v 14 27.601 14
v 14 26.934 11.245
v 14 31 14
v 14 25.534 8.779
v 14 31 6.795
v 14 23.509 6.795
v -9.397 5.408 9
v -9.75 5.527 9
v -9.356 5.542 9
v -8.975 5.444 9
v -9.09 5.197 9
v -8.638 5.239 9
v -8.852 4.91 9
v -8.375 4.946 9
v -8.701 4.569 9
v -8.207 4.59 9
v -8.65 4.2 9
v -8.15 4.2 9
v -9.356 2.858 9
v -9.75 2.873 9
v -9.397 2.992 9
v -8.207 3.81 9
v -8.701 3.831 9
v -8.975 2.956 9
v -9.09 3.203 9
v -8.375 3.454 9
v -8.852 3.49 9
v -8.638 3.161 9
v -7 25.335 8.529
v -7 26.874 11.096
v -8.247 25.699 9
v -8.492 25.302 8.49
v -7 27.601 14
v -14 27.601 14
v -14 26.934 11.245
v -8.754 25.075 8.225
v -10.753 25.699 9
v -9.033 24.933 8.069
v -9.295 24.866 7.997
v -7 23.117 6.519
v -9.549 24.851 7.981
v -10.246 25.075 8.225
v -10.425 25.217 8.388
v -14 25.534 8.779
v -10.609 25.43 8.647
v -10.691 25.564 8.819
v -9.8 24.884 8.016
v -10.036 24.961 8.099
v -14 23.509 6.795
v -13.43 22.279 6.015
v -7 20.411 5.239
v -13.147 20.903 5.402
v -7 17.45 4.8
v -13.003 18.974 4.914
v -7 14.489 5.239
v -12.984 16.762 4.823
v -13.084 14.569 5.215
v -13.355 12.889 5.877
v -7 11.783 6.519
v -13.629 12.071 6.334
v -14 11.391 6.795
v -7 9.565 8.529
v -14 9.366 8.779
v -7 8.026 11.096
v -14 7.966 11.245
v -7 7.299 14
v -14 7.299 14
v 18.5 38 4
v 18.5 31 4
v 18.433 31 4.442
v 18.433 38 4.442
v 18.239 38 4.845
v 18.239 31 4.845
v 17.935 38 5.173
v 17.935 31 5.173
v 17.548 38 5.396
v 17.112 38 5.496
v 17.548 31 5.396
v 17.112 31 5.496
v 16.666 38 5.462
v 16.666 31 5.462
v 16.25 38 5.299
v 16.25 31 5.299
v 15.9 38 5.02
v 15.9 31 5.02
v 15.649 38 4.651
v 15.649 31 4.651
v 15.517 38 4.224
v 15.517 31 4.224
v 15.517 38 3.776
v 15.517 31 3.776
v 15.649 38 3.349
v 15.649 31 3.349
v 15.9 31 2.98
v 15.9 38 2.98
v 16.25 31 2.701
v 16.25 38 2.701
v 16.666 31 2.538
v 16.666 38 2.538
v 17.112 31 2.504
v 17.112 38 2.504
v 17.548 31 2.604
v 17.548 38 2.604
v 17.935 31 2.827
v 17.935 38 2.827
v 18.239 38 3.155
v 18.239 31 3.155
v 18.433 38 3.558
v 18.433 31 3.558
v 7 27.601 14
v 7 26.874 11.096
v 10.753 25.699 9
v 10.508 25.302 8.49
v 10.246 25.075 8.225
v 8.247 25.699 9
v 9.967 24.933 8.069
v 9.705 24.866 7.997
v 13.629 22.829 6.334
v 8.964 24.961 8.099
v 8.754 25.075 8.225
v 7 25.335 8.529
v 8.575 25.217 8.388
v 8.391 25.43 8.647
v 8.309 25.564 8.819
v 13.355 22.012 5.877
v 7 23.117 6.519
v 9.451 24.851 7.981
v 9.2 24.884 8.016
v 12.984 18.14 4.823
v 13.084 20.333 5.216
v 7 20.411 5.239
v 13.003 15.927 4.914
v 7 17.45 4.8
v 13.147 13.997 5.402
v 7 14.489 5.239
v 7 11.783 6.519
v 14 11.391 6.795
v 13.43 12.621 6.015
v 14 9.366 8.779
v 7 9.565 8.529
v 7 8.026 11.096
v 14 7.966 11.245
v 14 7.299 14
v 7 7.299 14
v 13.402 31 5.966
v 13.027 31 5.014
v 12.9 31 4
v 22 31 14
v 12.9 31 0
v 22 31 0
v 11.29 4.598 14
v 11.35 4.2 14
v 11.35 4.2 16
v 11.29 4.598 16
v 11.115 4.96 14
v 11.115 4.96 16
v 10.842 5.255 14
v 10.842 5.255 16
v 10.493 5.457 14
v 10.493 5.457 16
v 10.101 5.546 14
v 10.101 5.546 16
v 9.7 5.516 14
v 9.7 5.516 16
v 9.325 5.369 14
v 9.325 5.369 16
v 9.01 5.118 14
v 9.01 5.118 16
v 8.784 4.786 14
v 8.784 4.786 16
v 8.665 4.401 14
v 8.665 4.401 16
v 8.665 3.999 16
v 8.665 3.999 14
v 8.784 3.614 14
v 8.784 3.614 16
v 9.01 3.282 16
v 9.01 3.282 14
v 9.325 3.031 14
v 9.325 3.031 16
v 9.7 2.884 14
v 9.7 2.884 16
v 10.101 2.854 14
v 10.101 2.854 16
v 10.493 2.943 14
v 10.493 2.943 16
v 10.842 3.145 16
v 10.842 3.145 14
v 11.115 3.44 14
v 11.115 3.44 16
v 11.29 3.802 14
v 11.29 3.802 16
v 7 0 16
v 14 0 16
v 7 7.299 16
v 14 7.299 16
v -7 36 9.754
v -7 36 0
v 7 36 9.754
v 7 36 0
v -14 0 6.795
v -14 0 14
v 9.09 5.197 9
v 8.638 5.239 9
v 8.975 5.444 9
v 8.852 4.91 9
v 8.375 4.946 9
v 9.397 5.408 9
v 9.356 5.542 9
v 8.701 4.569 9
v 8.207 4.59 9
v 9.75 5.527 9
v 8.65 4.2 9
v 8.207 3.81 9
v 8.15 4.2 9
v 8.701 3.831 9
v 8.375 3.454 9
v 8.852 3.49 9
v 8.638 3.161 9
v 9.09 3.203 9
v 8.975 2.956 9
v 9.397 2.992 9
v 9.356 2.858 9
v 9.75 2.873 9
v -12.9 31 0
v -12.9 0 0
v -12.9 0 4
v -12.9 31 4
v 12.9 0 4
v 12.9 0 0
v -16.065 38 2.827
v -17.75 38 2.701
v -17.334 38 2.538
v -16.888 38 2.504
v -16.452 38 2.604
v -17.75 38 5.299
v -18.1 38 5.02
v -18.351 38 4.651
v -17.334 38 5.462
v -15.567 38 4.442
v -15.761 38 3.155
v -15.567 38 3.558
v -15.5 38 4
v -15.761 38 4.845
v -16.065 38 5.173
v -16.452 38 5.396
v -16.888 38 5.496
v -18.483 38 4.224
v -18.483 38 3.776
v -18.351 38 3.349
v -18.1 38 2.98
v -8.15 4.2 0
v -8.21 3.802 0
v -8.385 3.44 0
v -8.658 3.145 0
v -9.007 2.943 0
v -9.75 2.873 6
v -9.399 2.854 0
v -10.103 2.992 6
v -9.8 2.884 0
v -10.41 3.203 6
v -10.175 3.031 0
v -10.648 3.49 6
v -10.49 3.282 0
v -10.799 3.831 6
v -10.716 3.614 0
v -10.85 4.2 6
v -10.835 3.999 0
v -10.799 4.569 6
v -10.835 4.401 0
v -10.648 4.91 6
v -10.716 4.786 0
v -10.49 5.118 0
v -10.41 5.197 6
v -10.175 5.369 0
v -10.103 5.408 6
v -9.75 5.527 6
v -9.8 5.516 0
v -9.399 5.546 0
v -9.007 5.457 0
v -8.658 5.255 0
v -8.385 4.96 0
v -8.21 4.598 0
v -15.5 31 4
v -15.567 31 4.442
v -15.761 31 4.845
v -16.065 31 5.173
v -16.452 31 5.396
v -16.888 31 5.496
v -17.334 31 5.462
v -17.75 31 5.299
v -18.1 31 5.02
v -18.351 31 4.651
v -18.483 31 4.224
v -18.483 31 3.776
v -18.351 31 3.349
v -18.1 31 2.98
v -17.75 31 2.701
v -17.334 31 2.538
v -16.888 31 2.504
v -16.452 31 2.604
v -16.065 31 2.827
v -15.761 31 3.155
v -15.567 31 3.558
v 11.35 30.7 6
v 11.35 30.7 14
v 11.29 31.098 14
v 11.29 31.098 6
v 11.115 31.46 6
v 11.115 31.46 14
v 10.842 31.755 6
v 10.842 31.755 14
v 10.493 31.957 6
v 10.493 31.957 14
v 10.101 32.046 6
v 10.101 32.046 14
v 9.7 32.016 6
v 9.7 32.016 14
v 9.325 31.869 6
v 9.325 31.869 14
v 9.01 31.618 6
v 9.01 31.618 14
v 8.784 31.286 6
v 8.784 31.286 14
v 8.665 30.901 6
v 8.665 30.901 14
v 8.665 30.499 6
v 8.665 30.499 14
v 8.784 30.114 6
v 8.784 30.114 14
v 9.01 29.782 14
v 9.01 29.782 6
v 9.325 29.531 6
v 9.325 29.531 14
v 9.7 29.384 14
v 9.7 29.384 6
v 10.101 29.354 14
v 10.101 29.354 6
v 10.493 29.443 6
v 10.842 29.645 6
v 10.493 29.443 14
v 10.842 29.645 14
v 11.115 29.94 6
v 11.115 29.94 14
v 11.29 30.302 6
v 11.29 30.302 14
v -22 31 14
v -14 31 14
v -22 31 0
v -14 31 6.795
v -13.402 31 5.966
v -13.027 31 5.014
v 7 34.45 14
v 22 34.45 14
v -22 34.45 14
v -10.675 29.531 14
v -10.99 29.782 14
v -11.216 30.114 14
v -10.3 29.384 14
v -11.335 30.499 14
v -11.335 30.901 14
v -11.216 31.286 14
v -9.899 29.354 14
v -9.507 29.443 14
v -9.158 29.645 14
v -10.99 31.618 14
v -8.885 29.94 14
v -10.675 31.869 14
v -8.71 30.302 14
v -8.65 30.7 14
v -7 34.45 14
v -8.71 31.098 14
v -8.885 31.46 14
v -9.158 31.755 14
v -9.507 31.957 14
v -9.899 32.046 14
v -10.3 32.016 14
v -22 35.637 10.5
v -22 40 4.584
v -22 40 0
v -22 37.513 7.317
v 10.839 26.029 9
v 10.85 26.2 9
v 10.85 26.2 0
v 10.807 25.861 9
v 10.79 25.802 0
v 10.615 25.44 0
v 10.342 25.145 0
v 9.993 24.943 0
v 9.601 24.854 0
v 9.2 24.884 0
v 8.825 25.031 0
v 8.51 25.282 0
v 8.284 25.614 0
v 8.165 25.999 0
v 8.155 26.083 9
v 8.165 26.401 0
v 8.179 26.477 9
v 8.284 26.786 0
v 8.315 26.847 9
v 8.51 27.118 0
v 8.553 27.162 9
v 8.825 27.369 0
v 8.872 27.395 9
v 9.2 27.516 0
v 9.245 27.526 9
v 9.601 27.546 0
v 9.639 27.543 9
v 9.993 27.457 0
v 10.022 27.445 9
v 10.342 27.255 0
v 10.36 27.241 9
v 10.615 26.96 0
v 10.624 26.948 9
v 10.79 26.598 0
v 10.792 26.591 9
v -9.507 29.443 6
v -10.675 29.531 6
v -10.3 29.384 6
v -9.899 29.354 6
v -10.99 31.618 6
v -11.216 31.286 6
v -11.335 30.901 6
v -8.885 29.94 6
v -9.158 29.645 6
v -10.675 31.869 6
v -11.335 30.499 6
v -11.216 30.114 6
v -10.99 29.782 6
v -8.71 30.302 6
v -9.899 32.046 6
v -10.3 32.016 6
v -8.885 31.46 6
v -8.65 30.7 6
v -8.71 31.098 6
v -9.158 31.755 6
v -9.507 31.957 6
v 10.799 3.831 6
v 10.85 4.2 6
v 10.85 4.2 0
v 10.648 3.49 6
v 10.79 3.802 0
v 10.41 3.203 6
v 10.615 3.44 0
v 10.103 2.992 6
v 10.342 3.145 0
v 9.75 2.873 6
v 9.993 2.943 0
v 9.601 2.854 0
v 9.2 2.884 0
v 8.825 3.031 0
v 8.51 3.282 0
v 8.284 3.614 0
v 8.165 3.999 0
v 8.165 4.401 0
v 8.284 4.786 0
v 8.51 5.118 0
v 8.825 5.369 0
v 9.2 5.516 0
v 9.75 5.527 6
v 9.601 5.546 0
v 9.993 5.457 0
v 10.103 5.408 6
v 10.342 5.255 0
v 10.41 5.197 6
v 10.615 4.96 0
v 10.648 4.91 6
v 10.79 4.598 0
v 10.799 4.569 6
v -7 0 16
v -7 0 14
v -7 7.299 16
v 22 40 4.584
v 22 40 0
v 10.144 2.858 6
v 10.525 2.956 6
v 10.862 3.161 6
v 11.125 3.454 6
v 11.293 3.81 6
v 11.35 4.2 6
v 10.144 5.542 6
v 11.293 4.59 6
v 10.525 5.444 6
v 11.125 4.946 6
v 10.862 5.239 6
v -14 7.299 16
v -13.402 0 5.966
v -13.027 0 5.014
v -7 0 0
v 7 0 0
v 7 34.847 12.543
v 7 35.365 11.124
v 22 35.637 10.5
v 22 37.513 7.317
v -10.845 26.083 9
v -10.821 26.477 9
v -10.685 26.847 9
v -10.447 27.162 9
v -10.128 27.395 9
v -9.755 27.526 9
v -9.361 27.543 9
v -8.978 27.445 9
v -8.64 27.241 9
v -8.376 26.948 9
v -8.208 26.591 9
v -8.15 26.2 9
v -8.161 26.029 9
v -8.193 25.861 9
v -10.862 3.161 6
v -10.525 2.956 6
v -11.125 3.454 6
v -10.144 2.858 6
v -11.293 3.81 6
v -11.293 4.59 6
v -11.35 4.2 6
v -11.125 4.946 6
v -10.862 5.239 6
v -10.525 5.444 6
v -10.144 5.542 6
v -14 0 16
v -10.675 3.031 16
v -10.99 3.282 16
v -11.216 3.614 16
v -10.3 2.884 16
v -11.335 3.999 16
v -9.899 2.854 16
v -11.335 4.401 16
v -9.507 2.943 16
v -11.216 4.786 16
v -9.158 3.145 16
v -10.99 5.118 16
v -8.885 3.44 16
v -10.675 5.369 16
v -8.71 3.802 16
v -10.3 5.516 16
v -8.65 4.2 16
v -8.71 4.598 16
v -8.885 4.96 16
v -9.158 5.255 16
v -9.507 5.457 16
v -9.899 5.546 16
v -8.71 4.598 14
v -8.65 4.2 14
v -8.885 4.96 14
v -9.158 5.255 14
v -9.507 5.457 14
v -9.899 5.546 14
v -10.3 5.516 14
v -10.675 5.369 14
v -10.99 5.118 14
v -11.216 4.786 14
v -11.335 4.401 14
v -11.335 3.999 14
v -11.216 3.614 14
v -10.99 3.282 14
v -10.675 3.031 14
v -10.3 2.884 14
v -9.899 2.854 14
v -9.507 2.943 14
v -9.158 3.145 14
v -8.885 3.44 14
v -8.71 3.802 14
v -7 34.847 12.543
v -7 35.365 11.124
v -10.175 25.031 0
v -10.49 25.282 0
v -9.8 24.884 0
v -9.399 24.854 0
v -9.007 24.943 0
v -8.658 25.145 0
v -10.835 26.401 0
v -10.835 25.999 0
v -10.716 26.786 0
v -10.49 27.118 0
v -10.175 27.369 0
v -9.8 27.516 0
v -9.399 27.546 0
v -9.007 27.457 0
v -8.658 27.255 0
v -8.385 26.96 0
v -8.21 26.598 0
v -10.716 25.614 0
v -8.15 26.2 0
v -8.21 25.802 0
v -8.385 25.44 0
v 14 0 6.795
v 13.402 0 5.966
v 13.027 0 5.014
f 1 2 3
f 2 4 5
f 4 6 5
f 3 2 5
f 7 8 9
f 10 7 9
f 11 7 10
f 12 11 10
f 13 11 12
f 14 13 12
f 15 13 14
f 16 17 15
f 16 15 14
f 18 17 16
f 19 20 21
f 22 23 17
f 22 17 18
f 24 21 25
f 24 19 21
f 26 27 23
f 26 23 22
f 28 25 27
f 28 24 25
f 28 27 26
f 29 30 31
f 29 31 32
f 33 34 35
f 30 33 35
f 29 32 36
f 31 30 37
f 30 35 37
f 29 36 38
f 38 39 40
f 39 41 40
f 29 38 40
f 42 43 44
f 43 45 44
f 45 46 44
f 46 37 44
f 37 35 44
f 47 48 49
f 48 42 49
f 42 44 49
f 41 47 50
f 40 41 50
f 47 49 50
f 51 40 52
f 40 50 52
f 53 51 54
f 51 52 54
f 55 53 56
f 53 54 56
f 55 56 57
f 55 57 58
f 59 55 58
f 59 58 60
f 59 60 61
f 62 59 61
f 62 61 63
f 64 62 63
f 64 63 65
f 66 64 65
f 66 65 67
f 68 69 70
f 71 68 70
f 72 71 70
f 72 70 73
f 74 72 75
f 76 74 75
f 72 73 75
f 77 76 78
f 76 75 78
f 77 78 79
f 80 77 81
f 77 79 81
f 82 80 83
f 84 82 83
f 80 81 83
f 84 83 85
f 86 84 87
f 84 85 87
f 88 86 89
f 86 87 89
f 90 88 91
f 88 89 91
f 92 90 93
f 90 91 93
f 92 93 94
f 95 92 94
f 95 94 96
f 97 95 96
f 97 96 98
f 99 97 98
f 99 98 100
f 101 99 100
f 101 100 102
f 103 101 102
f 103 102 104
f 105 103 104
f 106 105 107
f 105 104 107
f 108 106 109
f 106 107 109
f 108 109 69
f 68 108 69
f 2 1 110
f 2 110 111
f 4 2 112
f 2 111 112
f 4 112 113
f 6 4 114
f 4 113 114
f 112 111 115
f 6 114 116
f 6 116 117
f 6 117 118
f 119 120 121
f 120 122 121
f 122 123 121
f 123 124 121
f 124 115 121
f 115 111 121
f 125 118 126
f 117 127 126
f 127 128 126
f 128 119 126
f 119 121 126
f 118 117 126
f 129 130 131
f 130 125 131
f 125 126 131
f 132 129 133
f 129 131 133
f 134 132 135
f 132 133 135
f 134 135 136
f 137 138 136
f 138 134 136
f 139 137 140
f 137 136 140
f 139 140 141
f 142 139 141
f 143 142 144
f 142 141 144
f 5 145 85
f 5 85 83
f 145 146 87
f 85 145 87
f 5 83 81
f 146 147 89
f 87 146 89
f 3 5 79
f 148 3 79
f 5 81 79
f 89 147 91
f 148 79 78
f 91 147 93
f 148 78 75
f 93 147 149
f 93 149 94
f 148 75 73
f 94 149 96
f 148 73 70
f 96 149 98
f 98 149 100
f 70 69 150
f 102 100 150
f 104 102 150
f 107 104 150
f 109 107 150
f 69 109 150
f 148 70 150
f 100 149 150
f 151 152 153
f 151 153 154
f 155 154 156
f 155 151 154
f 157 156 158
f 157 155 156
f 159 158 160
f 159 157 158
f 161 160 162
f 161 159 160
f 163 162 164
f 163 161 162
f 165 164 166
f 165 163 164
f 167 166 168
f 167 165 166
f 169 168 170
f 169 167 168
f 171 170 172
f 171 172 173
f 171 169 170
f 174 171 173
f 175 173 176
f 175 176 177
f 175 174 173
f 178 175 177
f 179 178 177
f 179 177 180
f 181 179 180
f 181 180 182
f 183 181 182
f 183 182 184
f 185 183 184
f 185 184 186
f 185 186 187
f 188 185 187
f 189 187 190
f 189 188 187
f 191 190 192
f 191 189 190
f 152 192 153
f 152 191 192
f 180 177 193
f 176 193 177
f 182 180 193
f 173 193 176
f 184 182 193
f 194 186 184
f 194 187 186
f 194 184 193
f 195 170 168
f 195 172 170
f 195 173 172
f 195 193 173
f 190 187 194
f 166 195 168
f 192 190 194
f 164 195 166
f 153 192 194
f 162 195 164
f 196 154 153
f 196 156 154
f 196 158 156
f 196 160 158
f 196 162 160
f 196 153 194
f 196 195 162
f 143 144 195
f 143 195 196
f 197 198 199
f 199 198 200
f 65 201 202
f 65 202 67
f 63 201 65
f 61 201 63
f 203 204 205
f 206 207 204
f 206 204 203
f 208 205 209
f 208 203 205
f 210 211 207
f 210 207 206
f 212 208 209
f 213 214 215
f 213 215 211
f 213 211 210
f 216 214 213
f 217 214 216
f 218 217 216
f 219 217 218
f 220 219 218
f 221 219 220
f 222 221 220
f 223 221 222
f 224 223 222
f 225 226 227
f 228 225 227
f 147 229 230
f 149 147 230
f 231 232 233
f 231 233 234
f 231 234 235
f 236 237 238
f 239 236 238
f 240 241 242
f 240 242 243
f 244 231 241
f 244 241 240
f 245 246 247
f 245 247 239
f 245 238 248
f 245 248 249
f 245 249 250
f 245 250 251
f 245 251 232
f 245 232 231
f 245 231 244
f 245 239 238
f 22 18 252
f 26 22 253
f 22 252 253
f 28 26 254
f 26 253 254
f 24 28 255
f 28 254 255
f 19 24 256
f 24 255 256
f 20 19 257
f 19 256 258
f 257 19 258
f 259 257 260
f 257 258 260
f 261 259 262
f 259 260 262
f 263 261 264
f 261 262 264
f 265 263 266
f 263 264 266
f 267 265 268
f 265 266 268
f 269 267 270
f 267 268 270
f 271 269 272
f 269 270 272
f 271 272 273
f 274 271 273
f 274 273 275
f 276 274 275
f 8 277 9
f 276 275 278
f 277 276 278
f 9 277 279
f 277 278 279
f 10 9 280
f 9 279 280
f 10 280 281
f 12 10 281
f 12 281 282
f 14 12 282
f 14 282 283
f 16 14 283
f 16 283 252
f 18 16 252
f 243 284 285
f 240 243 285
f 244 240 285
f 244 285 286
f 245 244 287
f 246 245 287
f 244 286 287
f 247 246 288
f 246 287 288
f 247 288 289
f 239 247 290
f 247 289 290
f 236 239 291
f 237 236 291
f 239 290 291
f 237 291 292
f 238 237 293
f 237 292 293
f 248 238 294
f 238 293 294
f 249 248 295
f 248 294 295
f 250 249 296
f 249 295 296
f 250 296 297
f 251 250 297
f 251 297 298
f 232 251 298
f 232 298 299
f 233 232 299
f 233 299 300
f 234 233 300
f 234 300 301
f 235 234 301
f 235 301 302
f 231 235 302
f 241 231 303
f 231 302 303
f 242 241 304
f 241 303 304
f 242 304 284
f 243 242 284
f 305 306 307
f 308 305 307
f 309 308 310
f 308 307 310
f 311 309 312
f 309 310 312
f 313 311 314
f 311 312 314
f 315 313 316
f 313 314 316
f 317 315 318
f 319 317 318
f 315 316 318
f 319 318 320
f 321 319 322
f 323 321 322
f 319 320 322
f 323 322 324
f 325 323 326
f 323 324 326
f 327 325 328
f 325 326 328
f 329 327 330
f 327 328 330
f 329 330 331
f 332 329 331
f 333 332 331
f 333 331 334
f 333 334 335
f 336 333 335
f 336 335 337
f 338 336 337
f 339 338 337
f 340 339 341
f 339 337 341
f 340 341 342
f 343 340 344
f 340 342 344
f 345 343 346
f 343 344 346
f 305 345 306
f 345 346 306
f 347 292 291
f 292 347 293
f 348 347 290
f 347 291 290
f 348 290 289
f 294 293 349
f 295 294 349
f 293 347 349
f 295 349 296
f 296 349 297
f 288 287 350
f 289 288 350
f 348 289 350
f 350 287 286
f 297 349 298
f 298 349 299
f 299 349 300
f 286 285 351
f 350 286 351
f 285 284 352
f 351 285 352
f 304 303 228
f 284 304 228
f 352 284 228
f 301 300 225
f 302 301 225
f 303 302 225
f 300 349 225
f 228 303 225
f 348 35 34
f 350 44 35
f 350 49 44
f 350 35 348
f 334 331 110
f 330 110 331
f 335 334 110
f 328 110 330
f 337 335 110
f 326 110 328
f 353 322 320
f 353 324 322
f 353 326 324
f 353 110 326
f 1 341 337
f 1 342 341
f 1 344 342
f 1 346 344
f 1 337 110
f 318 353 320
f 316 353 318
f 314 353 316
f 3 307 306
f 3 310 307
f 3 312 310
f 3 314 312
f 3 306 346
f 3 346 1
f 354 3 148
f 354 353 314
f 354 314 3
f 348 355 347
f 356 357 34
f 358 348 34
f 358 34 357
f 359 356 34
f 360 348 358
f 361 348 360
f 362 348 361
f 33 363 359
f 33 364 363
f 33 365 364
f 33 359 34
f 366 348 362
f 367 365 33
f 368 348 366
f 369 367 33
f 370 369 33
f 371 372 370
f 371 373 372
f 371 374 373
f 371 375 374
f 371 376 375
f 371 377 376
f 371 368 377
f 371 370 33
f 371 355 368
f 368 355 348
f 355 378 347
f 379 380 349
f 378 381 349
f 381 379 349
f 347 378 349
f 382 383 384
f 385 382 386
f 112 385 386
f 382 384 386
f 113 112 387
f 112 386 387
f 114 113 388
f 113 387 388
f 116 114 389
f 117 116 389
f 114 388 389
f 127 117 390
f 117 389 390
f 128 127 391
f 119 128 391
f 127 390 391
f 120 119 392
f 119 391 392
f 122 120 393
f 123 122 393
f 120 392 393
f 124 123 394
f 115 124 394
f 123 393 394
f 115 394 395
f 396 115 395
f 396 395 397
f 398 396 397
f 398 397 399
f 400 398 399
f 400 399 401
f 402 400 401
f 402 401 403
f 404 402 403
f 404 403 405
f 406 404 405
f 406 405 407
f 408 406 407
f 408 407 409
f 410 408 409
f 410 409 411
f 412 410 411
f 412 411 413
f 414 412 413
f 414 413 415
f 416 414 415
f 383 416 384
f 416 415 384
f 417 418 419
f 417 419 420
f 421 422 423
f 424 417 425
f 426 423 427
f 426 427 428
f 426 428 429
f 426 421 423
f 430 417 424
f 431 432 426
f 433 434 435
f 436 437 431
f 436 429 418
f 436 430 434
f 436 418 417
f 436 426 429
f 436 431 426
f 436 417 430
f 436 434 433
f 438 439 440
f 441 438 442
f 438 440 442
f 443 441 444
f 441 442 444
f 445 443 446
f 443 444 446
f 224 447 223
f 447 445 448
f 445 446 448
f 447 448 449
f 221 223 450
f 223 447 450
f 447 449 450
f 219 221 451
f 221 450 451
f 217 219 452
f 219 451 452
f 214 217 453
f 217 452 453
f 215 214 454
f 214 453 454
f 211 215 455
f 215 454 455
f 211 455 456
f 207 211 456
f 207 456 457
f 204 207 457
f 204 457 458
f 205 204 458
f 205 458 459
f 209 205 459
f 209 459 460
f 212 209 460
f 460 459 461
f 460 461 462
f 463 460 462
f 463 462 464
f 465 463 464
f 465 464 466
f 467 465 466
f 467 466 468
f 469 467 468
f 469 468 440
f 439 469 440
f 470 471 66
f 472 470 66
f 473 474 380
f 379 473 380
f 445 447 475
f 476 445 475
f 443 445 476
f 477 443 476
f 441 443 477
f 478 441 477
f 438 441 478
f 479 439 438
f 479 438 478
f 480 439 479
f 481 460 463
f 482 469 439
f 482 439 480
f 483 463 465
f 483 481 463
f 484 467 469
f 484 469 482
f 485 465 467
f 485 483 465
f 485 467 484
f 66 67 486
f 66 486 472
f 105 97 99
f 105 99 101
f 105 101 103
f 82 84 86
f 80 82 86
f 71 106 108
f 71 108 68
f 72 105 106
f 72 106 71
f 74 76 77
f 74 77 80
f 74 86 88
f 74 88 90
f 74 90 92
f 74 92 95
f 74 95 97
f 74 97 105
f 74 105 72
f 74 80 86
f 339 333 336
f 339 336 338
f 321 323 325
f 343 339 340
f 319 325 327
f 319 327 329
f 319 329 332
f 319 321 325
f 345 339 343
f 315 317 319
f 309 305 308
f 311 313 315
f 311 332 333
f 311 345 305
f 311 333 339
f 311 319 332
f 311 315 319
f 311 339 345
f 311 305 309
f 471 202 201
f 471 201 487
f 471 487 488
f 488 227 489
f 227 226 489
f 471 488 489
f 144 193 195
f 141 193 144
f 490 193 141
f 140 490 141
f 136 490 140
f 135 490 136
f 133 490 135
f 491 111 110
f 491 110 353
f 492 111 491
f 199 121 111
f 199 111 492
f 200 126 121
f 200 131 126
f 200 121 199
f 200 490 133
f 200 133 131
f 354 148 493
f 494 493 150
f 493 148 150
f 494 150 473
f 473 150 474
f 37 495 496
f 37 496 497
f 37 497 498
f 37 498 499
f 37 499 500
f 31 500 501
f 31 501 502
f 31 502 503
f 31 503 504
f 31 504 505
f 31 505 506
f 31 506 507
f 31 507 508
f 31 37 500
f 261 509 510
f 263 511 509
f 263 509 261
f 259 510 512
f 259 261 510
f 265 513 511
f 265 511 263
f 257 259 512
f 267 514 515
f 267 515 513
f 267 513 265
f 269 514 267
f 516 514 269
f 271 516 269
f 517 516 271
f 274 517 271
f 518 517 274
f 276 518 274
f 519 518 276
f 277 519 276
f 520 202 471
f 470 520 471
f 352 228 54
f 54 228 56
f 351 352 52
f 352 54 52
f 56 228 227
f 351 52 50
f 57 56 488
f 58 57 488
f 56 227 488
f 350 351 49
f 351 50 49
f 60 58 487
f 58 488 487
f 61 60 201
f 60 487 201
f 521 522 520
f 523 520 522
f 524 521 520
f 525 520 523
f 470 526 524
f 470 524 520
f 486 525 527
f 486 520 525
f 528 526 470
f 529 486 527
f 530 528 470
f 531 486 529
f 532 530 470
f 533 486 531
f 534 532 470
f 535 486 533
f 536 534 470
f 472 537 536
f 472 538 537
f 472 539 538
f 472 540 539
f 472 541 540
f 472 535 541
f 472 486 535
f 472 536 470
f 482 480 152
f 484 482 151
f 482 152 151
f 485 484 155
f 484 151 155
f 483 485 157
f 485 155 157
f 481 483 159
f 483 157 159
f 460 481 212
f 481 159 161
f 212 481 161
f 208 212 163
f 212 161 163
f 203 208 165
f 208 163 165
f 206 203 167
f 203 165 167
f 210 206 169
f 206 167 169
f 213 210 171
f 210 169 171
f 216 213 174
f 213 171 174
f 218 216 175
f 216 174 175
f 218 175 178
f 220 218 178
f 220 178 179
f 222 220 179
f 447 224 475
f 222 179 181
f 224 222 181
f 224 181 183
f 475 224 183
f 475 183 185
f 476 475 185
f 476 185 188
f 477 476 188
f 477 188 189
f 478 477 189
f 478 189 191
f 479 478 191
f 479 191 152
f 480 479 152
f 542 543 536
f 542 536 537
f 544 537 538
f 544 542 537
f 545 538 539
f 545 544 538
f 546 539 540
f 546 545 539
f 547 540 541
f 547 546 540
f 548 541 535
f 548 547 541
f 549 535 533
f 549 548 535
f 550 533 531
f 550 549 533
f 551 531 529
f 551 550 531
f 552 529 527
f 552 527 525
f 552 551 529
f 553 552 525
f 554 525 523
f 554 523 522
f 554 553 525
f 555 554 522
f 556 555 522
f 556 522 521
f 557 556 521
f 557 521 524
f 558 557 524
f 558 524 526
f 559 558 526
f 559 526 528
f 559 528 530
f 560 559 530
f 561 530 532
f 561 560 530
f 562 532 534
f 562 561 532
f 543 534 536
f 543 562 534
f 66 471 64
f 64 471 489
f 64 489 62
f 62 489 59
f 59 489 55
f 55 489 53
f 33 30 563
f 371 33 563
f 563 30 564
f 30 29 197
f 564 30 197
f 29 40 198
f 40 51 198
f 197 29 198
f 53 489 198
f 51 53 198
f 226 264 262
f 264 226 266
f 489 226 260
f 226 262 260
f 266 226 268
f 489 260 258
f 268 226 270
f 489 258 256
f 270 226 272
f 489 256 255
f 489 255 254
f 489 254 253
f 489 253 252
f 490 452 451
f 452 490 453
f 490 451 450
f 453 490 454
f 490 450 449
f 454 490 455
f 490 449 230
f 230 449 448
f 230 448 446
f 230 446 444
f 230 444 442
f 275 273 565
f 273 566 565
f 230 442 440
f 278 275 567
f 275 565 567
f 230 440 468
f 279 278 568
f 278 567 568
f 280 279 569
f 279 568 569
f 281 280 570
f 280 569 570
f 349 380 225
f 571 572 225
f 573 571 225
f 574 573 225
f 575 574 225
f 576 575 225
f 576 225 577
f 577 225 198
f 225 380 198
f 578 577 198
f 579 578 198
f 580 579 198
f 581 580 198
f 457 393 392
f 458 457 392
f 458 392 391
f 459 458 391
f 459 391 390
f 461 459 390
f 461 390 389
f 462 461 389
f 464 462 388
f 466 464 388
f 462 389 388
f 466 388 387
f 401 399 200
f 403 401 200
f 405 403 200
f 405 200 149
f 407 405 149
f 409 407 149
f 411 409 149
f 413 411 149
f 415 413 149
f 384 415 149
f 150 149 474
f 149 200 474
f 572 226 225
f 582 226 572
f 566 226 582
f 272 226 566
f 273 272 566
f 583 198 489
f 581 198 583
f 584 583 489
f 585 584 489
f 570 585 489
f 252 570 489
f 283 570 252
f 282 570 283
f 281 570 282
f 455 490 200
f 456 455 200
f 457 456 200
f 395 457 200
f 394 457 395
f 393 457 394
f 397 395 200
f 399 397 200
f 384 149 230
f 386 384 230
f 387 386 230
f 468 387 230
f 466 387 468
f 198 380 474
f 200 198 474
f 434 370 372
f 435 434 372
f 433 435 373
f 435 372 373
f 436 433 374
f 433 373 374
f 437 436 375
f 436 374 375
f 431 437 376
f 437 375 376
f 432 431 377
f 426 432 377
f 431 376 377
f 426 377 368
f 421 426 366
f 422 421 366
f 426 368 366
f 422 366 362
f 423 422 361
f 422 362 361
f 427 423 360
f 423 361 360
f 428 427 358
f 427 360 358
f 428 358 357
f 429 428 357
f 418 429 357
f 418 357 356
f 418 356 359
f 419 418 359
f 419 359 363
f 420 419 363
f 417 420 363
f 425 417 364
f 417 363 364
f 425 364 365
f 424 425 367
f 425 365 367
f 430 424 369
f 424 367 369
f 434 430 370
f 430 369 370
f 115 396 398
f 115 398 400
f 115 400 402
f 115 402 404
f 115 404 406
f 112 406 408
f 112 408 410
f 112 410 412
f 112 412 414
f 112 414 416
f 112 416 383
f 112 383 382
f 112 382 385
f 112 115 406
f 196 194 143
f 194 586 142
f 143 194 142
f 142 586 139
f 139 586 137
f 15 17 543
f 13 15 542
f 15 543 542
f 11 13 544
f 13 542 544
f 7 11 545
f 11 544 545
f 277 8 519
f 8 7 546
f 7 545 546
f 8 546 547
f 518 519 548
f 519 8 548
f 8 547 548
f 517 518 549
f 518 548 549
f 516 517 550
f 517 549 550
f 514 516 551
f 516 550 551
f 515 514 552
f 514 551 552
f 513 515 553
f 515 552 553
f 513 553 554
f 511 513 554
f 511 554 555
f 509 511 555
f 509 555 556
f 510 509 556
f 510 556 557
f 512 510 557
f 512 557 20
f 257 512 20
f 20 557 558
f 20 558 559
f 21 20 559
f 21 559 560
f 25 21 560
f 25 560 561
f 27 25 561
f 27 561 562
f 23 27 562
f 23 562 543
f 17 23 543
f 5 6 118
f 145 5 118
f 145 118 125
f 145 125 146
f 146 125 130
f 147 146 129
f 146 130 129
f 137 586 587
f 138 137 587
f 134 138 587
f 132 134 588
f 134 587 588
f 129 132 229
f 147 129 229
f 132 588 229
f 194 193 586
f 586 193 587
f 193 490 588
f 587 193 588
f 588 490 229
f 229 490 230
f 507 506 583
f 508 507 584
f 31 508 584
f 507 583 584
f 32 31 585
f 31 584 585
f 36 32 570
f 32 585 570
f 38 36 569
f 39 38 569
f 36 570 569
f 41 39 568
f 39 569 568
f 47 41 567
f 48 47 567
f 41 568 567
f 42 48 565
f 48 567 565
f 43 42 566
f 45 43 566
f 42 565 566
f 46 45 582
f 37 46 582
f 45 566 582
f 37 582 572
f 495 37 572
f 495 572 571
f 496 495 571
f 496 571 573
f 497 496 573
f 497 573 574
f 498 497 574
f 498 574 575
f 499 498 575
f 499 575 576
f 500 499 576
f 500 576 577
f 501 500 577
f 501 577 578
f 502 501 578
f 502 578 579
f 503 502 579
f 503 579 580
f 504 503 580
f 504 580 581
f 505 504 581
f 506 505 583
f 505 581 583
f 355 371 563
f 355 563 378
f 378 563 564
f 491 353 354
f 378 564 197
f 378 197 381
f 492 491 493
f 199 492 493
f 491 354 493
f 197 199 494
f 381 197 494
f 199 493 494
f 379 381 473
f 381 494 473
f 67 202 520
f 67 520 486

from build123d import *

# Parameters (mm, degrees)
F0_W      = 7
F0_H      = 31
F1_DEPTH  = 14
F2_R      = 1.35
F3_DEPTH  = 8
F4_R      = 10.2
F5_DEPTH  = 30
F6_R      = 1.35
F7_DEPTH  = 9
F8_R      = 1.5
F9_DEPTH  = 7
F10_R     = 18
F11_DEPTH = 44.001
F13_DEPTH = 31
F14_W     = 7
F14_H     = 7.299138
F14_R     = 1.35
F15_DEPTH = 2


with BuildPart() as f1:
    # F0 (on Top) → F1 (new body)
    with BuildSketch(Plane.XY):
        with Locations((-10.5, 15.5)):
            Rectangle(F0_W, F0_H)
        Polygon((-22, 31), (-14, 31), (-7, 31), (-7, 36), (7, 36), (7, 31), (14, 31), (22, 31), (22, 40), (-22, 40), align=None)
        with Locations((10.5, 15.5)):
            Rectangle(F0_W, F0_H)
    extrude(amount=F1_DEPTH)

    # F2 (on face) → F3 (cut)
    with BuildSketch(Plane.XY.offset(14)):
        with Locations((-10, 4.2)):
            Circle(F2_R)
        with Locations((-10, 30.7)):
            Circle(F2_R)
        with Locations((10, 30.7)):
            Circle(F2_R)
        with Locations((10, 4.2)):
            Circle(F2_R)
    extrude(amount=-F3_DEPTH, mode=Mode.SUBTRACT)

    # F4 (on face) → F5 (cut)
    with BuildSketch(Plane(origin=(-14, 0, 0), x_dir=(0, -1, 0), z_dir=(-1, 0, 0))):
        with Locations((-17.45, 15)):
            Circle(F4_R)
    extrude(amount=-F5_DEPTH, mode=Mode.SUBTRACT)

    # F6 (on face) → F7 (cut)
    with BuildSketch(Plane(origin=(0, 0, 0), x_dir=(1, 0, 0), z_dir=(0, 0, -1))):
        with Locations((9.5, -4.2)):
            Circle(F6_R)
        with Locations((-9.5, -4.2)):
            Circle(F6_R)
        with Locations((9.5, -26.2)):
            Circle(F6_R)
        with Locations((-9.5, -26.2)):
            Circle(F6_R)
    extrude(amount=-F7_DEPTH, mode=Mode.SUBTRACT)

    # F8 (on face) → F9 (cut)
    with BuildSketch(Plane.XZ.offset(-31)):
        with Locations((-17, 4)):
            Circle(F8_R)
        with Locations((17, 4)):
            Circle(F8_R)
    extrude(amount=-F9_DEPTH, mode=Mode.SUBTRACT)

    # F10 (on face) → F11 (cut, through all)
    with BuildSketch(Plane.YZ.offset(22)):
        with Locations((52, 18)):
            Circle(F10_R)
    extrude(amount=-F11_DEPTH, mode=Mode.SUBTRACT)

    # F12 (on face) → F13 (cut, through all)
    with BuildSketch(Plane.XZ):
        with BuildLine():
            Line((-12.9, -5.045816), (-12.9, 4))
            ThreePointArc((-12.9, 4), (-18.692576, 7.734325), (-19.70253, 0.916766))
            Line((-19.70253, 0.916766), (-12.9, -5.045816))
        make_face()
        with BuildLine():
            Line((12.9, -5.045816), (19.70253, 0.916766))
            ThreePointArc((19.70253, 0.916766), (18.692576, 7.734325), (12.9, 4))
            Line((12.9, 4), (12.9, -5.045816))
        make_face()
    extrude(amount=-F13_DEPTH, mode=Mode.SUBTRACT)

    # F14 (on face) → F15 (join)
    with BuildSketch(Plane.XY.offset(14)):
        with Locations((10.5, 3.649569)):
            Rectangle(F14_W, F14_H)
        with Locations((10, 4.2)):
            Circle(F14_R, mode=Mode.SUBTRACT)
        with Locations((-10.5, 3.649569)):
            Rectangle(F14_W, F14_H)
        with Locations((-10, 4.2)):
            Circle(F14_R, mode=Mode.SUBTRACT)
    extrude(amount=F15_DEPTH)


solid = f1.part
